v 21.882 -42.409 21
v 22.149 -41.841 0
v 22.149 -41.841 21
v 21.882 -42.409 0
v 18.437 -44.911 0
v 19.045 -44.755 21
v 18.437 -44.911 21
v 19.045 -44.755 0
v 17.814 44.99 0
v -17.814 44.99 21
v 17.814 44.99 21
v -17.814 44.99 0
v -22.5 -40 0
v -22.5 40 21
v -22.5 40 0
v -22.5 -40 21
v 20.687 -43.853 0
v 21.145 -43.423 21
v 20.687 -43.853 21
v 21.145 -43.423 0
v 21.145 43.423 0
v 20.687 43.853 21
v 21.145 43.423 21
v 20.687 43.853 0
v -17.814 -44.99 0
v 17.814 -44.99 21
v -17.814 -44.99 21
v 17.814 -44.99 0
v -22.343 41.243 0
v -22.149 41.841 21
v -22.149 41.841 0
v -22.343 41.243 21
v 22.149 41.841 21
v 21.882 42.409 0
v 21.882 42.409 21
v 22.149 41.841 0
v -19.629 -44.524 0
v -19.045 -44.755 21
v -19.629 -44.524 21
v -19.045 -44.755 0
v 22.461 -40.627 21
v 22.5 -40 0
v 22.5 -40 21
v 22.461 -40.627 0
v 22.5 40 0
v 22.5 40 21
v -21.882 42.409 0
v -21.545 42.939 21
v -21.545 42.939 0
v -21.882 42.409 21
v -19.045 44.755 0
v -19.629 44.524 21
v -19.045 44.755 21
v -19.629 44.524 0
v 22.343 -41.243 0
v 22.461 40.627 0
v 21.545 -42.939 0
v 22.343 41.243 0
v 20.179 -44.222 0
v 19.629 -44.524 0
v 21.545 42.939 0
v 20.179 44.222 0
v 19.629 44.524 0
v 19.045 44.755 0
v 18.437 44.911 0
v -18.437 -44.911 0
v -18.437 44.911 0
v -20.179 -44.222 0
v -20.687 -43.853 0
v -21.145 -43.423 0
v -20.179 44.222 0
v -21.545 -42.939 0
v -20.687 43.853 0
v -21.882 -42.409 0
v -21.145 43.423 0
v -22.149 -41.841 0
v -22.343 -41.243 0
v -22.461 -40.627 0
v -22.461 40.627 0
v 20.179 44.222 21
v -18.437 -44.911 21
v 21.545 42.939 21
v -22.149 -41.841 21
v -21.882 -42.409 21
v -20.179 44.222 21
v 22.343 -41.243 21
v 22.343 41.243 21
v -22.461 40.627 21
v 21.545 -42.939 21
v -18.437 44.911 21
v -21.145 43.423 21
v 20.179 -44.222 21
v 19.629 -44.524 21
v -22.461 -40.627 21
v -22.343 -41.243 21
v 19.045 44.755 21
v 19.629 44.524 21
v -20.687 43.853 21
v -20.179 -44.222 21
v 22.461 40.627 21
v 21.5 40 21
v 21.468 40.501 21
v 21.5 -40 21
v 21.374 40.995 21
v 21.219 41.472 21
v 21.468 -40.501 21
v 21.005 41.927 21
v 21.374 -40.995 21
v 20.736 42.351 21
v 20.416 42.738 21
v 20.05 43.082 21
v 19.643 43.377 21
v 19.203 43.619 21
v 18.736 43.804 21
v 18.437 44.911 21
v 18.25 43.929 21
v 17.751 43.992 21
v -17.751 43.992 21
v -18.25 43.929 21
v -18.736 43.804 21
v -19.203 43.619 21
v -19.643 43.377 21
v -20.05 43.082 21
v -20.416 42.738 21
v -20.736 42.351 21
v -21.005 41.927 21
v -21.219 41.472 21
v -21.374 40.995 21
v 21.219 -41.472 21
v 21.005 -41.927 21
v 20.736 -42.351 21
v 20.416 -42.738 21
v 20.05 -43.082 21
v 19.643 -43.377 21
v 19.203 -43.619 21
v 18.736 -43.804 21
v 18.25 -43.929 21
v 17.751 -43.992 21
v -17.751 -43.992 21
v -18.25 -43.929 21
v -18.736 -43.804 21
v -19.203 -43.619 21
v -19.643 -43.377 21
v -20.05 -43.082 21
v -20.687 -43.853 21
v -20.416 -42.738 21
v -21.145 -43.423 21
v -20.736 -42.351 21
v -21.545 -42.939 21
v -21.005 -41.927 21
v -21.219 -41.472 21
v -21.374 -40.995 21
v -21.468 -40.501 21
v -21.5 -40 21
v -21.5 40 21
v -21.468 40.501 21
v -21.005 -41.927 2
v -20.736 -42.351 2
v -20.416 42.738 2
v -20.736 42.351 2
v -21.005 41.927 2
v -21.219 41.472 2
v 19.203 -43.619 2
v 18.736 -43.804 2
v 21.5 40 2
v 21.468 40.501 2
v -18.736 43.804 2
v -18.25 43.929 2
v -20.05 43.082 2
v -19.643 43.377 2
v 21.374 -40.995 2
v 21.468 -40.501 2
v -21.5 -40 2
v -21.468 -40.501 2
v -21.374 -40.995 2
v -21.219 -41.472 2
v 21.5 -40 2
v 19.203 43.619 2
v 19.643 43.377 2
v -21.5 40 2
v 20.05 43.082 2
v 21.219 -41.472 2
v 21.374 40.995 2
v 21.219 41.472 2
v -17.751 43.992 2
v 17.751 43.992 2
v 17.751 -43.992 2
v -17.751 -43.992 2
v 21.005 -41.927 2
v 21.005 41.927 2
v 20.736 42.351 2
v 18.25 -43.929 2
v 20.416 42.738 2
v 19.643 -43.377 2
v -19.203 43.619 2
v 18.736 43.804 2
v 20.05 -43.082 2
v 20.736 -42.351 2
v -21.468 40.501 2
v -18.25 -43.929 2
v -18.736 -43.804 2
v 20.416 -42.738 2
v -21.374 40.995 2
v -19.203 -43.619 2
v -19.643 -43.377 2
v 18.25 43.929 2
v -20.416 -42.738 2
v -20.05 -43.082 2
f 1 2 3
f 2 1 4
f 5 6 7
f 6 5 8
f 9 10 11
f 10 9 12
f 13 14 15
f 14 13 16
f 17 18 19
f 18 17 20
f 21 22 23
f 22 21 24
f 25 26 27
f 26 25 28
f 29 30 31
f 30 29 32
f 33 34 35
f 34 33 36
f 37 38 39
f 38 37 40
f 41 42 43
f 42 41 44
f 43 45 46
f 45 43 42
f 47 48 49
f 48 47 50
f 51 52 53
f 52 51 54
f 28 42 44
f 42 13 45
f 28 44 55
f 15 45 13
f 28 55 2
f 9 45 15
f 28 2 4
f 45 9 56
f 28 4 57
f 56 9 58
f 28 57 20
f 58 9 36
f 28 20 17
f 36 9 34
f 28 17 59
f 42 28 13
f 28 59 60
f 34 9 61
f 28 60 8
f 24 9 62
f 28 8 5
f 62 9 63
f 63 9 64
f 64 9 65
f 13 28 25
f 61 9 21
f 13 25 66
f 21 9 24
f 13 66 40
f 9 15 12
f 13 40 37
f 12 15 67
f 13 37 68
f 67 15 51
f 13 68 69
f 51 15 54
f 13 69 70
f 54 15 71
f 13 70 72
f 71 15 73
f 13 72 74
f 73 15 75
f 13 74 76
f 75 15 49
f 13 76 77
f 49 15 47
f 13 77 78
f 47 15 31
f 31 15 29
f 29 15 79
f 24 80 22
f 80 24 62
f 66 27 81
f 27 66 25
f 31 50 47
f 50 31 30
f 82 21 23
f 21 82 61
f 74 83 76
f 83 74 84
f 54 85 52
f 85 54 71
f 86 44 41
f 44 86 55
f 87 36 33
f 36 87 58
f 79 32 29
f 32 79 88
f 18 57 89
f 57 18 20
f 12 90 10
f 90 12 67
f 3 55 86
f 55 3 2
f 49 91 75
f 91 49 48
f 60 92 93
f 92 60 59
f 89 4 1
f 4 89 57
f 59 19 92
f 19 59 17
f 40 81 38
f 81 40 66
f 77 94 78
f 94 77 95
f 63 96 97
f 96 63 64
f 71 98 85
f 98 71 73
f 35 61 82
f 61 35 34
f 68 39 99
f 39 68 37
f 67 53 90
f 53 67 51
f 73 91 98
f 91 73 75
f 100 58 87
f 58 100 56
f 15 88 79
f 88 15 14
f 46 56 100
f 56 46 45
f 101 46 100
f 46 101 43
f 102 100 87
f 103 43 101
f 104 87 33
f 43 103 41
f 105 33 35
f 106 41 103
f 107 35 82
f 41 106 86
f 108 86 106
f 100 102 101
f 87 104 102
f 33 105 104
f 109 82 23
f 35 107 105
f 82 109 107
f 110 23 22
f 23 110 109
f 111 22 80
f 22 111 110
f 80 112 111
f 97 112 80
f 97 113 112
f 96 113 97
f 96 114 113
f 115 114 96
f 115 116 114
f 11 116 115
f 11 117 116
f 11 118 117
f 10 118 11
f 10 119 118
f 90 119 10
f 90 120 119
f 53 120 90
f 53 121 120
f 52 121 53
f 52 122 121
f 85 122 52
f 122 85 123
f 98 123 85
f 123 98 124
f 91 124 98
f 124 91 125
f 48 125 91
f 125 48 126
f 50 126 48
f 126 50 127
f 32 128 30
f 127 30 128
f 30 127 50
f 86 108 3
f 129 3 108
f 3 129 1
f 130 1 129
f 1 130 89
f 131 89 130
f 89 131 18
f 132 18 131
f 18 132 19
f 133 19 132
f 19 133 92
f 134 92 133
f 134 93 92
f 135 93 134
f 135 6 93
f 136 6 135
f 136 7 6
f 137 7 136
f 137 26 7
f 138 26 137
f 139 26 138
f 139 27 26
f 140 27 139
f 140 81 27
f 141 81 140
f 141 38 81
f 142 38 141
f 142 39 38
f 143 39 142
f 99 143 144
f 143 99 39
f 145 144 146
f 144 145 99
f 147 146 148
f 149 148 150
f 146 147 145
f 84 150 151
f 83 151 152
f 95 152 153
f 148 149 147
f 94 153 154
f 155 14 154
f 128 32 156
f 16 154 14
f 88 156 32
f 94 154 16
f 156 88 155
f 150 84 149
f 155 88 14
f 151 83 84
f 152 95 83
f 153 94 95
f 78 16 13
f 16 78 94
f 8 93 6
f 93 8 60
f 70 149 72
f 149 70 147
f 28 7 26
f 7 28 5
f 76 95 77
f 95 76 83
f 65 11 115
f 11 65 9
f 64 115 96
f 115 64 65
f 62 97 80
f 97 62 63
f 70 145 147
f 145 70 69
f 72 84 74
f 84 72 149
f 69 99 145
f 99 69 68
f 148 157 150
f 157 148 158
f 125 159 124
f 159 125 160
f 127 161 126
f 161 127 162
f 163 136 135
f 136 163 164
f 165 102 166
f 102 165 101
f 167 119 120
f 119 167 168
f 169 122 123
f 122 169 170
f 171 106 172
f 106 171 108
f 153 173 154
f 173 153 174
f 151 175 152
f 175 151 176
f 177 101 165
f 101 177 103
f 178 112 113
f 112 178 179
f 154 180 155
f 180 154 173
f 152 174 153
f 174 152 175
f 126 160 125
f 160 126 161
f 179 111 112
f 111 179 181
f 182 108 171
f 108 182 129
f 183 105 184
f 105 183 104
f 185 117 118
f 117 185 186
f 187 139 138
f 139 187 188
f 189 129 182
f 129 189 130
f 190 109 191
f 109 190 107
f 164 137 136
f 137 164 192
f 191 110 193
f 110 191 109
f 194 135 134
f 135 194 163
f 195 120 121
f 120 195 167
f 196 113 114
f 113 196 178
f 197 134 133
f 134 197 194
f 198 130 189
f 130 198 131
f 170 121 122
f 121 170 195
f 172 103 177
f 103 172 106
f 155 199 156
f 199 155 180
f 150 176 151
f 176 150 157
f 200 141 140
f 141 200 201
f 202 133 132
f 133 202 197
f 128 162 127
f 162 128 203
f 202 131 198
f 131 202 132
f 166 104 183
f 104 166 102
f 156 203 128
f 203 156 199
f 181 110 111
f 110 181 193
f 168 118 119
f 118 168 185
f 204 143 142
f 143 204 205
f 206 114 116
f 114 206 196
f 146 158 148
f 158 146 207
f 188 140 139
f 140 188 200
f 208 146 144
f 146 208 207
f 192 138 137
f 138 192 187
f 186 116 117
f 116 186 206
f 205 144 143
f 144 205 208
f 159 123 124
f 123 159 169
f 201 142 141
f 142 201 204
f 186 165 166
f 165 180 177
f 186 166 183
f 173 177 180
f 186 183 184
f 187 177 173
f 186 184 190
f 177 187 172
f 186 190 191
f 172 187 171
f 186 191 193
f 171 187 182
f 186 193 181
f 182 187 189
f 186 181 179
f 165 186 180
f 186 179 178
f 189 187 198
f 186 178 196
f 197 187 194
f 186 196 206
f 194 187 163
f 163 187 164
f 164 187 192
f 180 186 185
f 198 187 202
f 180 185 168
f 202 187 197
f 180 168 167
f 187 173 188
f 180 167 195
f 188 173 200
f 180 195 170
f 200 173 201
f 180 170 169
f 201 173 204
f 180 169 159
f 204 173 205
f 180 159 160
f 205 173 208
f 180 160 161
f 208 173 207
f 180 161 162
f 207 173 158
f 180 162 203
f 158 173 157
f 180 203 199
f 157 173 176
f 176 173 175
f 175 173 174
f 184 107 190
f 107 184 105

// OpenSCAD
$fn = 50;


difference() {
	union() {
		hull() {
			translate(v = [-17.5000000000, 40.0000000000, 0]) {
				cylinder(h = 21, r = 5);
			}
			translate(v = [17.5000000000, 40.0000000000, 0]) {
				cylinder(h = 21, r = 5);
			}
			translate(v = [-17.5000000000, -40.0000000000, 0]) {
				cylinder(h = 21, r = 5);
			}
			translate(v = [17.5000000000, -40.0000000000, 0]) {
				cylinder(h = 21, r = 5);
			}
		}
	}
	union() {
		translate(v = [0, 0, 2]) {
			hull() {
				translate(v = [-17.5000000000, 40.0000000000, 0]) {
					cylinder(h = 19, r = 4);
				}
				translate(v = [17.5000000000, 40.0000000000, 0]) {
					cylinder(h = 19, r = 4);
				}
				translate(v = [-17.5000000000, -40.0000000000, 0]) {
					cylinder(h = 19, r = 4);
				}
				translate(v = [17.5000000000, -40.0000000000, 0]) {
					cylinder(h = 19, r = 4);
				}
			}
		}
	}
}
